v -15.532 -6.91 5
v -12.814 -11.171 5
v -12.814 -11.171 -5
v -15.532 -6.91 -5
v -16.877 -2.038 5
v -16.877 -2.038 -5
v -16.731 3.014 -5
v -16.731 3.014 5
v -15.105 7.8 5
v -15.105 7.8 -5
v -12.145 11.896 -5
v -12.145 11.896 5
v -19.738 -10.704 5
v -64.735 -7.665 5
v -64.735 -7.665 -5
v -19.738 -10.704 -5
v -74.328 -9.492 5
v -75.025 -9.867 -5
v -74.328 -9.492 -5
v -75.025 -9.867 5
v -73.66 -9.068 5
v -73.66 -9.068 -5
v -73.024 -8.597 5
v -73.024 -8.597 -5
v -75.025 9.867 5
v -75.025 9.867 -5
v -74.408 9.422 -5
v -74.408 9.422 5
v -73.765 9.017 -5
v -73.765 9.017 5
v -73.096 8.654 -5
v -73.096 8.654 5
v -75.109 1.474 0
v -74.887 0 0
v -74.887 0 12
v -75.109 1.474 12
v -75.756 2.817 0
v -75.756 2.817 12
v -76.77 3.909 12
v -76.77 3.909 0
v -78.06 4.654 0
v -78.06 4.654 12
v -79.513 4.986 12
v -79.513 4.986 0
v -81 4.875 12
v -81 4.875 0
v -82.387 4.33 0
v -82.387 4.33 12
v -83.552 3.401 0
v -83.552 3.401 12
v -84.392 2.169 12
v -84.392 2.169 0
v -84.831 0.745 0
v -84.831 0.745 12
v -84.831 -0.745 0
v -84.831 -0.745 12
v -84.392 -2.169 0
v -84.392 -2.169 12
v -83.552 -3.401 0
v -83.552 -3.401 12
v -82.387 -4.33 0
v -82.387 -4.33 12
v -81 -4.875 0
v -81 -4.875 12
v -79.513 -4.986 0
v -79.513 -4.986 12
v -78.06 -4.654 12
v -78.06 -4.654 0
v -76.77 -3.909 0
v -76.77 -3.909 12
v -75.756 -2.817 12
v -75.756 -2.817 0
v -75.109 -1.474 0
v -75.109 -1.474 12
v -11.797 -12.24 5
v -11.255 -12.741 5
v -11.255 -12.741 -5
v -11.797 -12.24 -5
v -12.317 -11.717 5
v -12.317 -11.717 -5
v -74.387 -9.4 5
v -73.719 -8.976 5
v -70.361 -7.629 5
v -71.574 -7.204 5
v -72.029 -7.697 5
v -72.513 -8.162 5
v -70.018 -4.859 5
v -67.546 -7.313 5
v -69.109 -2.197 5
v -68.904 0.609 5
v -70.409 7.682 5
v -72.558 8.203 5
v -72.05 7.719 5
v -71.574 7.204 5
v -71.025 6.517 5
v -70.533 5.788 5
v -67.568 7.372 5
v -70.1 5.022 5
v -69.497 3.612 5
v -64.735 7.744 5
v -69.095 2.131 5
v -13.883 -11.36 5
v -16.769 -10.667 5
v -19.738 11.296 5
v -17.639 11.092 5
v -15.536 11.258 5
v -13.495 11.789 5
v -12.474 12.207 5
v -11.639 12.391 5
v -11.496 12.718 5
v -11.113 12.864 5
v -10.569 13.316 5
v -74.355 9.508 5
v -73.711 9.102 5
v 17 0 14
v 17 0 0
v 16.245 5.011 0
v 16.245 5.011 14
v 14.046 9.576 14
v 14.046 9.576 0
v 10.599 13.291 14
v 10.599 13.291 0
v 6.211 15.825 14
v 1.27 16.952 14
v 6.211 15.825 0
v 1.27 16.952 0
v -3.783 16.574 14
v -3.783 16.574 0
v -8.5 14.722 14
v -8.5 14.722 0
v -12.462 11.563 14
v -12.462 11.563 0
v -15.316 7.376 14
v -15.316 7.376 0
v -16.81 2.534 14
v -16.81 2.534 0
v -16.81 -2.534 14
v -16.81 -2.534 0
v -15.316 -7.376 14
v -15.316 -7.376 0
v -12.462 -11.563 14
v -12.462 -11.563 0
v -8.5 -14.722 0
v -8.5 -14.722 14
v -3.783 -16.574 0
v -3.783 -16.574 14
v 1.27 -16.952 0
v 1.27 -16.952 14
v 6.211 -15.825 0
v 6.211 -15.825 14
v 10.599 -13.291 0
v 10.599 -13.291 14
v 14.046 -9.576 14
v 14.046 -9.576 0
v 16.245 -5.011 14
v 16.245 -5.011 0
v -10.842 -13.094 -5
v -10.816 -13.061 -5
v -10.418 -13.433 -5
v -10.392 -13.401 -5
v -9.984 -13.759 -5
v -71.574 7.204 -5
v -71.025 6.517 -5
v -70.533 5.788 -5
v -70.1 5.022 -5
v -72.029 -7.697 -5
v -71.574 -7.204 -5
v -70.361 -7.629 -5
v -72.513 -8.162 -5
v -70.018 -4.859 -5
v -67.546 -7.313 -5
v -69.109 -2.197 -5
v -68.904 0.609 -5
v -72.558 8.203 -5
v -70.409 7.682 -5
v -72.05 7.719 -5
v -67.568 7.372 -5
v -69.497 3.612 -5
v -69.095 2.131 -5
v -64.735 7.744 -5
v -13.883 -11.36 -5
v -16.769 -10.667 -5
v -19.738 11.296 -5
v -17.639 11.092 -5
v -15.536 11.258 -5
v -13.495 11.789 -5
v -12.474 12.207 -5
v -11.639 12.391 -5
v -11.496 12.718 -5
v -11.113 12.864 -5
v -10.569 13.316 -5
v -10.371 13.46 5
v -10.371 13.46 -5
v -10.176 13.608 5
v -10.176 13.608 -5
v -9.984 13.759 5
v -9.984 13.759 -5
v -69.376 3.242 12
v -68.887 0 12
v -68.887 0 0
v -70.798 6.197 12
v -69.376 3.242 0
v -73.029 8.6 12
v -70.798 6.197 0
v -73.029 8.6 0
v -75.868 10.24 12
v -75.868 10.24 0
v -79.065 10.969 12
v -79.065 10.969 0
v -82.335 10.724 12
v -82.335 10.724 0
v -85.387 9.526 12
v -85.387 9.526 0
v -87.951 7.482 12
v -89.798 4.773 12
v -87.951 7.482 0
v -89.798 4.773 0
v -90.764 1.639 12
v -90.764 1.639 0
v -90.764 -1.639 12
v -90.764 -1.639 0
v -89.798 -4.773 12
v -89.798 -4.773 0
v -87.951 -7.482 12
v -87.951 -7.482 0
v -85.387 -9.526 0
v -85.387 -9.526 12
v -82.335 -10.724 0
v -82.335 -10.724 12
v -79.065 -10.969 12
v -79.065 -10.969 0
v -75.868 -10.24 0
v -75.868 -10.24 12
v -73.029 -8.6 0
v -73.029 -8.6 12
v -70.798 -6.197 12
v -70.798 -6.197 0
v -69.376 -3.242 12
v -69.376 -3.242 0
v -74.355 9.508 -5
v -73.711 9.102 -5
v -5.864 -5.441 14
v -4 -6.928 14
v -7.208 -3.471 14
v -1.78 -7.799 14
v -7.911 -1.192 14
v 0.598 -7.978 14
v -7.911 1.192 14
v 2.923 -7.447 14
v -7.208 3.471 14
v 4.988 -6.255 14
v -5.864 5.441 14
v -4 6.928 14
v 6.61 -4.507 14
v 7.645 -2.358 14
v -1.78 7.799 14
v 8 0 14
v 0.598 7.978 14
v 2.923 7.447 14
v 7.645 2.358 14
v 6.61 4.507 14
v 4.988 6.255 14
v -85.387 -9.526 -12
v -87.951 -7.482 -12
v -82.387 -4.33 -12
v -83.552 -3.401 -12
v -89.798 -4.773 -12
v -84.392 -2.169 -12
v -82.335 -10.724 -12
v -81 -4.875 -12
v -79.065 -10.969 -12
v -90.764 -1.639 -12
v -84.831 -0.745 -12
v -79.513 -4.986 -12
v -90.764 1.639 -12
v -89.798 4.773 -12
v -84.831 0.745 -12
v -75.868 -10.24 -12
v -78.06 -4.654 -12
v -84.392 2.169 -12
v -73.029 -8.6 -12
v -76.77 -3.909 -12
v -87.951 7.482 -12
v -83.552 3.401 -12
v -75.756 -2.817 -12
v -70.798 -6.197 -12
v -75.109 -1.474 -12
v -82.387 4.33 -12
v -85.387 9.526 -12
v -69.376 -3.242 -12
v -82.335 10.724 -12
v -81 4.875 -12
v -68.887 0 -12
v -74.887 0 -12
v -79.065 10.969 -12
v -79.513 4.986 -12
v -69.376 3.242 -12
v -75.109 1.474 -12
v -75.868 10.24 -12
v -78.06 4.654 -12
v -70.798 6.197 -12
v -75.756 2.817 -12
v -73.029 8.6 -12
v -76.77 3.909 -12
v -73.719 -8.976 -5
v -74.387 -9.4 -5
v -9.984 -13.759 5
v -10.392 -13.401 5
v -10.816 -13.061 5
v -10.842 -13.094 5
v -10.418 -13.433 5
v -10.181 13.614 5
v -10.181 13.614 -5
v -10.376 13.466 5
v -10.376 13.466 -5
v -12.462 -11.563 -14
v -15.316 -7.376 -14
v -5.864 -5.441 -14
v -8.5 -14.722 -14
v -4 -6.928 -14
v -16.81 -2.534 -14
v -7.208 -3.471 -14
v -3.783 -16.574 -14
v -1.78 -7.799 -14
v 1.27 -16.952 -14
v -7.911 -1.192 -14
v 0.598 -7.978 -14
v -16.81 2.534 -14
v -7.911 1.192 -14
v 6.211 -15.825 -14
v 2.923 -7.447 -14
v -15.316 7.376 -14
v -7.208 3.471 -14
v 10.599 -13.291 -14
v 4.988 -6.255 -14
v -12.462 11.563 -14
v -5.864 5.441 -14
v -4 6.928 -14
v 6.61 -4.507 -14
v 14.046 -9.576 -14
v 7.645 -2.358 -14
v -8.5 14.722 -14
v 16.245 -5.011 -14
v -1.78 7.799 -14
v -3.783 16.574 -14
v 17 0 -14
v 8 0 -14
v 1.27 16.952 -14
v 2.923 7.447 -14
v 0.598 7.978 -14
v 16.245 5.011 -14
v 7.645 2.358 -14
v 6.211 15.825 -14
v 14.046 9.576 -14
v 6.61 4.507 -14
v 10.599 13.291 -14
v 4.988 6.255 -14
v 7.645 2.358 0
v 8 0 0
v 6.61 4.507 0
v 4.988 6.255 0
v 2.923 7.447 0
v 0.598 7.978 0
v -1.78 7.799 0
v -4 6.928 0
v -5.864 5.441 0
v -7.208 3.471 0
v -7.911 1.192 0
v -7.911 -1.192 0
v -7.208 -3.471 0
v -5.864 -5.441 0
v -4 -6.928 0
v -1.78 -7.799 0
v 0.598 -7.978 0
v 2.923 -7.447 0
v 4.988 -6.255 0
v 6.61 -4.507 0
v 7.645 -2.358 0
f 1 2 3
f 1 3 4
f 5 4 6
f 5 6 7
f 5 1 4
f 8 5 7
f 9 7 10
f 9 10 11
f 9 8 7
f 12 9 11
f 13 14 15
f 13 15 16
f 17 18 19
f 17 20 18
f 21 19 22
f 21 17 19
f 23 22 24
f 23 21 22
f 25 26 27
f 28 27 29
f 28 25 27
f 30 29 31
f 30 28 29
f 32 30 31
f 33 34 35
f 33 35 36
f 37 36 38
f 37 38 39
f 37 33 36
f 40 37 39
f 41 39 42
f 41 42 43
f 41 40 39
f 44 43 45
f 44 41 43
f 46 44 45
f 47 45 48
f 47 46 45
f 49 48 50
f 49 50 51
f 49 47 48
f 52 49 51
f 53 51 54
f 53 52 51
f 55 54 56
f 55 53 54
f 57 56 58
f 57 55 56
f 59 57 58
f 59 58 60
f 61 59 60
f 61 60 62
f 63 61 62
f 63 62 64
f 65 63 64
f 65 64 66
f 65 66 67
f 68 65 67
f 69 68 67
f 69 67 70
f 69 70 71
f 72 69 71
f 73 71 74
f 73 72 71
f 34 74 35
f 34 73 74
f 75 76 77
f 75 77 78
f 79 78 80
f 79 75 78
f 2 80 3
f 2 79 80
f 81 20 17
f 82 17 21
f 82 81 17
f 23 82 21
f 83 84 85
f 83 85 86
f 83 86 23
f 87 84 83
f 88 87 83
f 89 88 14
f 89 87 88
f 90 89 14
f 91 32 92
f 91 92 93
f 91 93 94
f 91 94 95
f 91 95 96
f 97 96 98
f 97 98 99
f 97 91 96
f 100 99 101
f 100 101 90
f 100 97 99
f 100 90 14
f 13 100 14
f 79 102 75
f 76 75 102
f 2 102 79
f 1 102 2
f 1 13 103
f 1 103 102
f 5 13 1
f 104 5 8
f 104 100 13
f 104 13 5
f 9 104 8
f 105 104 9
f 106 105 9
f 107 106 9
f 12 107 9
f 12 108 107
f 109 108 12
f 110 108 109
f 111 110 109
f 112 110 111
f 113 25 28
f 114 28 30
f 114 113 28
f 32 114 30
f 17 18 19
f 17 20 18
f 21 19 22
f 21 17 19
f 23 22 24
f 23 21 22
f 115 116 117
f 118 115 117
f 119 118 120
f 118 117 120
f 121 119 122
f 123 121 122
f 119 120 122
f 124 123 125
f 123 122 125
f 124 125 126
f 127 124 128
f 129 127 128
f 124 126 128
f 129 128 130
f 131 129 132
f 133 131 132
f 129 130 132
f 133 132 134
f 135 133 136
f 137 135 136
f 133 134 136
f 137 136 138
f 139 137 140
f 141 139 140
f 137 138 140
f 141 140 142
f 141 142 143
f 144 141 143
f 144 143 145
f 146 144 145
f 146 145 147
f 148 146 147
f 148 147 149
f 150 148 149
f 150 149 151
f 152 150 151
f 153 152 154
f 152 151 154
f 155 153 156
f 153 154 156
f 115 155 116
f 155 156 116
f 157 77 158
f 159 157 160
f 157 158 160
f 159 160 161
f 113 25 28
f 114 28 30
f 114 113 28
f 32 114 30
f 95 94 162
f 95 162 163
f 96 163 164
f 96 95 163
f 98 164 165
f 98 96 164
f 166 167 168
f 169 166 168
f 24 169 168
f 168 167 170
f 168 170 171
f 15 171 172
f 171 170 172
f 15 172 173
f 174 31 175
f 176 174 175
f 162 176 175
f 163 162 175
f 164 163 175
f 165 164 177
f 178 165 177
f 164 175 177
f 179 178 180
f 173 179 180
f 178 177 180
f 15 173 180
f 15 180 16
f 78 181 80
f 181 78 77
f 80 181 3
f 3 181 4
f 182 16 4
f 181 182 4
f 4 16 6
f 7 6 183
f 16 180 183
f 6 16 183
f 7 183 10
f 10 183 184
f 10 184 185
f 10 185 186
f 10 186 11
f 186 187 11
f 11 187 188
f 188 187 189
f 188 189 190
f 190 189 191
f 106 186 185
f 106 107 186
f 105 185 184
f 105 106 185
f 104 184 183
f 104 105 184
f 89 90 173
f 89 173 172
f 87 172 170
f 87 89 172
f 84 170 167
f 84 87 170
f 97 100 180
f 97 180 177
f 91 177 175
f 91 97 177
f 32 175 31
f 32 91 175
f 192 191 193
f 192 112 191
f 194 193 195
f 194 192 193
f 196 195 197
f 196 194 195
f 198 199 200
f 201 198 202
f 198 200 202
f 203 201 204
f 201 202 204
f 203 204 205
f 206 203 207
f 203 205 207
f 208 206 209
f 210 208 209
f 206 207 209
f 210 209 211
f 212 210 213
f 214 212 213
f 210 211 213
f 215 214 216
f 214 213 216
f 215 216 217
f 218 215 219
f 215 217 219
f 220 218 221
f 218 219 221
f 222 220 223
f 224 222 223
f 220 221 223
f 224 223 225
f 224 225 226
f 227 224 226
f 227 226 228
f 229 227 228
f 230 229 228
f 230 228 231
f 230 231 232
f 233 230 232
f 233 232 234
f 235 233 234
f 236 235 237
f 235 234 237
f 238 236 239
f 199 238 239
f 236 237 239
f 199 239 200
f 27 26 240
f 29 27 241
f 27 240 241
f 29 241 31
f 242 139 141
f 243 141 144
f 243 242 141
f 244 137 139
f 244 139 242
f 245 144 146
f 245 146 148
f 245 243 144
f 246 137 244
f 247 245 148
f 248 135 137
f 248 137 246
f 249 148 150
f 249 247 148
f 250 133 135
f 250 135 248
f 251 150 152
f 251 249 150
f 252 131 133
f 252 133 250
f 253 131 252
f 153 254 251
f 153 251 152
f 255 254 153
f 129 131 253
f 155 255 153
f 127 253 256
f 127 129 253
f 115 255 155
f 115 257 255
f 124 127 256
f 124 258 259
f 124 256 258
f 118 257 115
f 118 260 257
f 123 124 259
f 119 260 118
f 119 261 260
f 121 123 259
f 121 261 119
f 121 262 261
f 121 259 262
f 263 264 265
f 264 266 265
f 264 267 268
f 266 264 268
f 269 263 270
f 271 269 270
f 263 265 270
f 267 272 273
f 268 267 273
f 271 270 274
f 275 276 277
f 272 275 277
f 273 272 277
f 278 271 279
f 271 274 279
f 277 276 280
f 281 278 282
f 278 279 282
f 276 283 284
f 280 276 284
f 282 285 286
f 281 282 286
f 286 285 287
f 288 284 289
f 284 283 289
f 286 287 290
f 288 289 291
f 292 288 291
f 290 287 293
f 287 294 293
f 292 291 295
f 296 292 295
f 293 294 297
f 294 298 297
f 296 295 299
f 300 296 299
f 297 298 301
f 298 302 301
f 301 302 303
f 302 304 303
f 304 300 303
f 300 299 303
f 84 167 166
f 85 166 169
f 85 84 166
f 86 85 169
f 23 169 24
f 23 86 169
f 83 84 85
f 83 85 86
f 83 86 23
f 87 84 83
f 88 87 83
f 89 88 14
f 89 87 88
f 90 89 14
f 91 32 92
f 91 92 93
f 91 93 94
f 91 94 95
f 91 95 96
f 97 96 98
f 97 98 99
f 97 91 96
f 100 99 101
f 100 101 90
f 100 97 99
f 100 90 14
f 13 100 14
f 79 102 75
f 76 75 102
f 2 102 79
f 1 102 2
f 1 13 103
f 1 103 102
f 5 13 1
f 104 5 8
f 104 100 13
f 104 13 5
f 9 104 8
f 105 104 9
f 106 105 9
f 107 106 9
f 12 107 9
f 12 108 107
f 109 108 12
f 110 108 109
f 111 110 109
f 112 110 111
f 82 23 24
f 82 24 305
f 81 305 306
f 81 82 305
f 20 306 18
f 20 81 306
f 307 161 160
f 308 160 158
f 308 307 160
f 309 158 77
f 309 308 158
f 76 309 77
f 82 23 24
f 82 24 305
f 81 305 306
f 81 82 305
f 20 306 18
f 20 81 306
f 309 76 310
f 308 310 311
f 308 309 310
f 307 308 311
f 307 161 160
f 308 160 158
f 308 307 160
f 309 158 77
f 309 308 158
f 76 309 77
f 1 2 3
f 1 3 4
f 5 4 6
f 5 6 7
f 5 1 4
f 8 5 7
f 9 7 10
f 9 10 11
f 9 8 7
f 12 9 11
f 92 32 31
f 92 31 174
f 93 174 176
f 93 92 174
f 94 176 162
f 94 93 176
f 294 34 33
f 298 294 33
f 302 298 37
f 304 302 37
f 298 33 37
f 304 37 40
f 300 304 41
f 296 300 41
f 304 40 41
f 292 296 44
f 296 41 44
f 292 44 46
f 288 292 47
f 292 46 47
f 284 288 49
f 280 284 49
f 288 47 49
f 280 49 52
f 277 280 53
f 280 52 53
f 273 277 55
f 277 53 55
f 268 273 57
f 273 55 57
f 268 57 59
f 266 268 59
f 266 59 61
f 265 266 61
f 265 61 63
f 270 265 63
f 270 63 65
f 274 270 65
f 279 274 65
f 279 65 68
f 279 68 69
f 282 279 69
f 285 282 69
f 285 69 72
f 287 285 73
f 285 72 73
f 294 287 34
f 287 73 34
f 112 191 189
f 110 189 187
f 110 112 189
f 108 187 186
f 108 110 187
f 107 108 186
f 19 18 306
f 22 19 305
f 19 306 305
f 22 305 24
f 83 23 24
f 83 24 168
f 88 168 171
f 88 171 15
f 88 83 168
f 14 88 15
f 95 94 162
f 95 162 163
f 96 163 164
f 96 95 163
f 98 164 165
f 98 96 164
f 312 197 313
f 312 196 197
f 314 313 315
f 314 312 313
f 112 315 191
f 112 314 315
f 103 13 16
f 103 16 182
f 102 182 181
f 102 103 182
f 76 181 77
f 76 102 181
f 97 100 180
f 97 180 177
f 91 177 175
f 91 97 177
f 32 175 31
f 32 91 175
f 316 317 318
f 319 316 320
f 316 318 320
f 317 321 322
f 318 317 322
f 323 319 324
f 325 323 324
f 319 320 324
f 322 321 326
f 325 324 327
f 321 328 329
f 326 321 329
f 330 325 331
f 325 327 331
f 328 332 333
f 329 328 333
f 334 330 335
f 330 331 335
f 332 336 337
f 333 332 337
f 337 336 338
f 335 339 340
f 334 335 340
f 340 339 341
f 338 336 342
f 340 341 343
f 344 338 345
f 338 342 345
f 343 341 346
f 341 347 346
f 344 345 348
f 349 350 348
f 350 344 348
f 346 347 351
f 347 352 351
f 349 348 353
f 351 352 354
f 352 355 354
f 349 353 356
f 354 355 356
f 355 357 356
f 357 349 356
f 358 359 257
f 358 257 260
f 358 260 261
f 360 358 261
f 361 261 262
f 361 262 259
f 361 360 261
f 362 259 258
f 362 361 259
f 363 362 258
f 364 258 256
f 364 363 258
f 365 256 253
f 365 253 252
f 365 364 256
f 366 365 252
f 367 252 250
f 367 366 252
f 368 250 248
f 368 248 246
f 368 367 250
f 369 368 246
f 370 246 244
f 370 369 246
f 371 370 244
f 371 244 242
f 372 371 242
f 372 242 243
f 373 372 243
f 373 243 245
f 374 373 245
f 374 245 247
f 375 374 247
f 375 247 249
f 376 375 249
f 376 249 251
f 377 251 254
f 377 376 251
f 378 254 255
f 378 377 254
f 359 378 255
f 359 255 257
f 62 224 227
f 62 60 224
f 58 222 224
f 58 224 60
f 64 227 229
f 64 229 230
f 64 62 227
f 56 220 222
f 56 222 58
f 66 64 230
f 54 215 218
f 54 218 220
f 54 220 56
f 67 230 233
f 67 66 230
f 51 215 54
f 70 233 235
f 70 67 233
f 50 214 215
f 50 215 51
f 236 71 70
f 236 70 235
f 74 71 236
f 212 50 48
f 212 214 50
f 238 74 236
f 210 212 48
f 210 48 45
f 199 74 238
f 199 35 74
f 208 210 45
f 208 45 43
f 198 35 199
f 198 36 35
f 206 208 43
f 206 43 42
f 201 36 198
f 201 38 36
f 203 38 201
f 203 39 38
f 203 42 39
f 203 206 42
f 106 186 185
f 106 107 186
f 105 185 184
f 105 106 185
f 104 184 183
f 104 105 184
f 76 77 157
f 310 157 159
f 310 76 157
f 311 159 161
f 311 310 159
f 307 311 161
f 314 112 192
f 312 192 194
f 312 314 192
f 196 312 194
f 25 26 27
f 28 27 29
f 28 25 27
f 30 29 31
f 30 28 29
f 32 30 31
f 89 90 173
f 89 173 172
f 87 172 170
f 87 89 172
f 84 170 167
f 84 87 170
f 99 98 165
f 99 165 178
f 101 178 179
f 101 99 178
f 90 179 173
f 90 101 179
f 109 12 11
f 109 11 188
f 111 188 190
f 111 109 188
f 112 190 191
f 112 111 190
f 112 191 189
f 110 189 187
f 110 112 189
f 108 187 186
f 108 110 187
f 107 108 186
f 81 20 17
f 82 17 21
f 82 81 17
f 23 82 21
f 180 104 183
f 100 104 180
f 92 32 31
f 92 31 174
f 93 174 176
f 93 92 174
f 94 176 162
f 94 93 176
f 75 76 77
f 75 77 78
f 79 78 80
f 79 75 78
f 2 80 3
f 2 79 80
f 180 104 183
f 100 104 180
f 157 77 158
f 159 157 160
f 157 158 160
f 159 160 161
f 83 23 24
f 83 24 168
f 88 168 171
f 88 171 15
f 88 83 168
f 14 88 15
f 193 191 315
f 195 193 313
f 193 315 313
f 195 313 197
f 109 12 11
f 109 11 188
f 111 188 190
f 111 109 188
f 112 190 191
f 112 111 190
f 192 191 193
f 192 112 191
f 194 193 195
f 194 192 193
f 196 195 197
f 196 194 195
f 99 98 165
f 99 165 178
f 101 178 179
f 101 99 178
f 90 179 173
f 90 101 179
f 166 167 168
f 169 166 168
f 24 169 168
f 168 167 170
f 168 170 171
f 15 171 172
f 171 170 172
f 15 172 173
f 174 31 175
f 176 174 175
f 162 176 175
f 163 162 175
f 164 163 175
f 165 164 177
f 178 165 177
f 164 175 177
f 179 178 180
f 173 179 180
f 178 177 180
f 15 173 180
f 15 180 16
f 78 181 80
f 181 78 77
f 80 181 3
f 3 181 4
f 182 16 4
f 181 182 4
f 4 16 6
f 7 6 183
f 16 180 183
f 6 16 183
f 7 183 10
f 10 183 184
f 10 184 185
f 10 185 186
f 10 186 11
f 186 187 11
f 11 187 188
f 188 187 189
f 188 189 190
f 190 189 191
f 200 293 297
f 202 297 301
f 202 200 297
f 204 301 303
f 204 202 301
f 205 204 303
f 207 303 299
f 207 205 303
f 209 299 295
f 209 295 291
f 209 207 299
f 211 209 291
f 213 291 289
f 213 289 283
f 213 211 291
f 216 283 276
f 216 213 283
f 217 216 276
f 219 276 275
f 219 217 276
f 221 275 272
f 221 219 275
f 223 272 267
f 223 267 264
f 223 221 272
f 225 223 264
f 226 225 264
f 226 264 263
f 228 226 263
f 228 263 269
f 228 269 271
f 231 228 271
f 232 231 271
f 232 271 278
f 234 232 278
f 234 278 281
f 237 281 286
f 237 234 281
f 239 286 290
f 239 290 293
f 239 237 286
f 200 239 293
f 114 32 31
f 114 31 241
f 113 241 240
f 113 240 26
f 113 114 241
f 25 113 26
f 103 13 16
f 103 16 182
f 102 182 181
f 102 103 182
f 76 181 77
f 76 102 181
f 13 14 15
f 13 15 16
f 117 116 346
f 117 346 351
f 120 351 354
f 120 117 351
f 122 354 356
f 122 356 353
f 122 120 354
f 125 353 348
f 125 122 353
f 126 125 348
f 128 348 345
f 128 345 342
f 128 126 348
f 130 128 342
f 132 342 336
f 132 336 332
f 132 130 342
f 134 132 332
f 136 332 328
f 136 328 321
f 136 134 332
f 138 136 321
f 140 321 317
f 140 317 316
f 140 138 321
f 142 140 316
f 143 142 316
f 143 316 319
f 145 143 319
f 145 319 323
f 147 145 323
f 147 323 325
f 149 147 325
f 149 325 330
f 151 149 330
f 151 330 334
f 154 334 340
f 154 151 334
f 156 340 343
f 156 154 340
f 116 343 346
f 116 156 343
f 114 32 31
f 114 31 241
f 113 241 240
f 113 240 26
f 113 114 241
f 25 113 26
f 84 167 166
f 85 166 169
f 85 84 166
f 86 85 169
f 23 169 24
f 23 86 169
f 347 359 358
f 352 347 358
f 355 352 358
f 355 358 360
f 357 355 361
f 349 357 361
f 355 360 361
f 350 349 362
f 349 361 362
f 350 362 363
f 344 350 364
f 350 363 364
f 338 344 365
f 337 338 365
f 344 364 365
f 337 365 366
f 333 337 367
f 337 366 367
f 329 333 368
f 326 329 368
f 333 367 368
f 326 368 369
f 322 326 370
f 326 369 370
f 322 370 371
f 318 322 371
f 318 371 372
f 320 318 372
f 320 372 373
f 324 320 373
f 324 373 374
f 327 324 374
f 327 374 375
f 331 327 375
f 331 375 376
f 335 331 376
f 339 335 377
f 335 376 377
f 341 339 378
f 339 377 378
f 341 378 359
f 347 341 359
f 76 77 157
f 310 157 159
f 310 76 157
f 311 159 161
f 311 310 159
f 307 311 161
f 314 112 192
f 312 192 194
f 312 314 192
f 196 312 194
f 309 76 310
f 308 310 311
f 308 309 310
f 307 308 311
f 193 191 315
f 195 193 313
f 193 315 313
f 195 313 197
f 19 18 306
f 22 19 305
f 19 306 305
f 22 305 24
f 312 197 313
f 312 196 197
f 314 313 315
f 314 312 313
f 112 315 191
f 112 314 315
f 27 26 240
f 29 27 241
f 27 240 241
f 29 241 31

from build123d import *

# Parameters (mm, degrees)
F0_R      = 17
F0_R_2    = 8
F1_DEPTH  = 14
F2_R      = 17
F2_R_2    = 8
F3_DEPTH  = 14
F4_R      = 11
F4_R_2    = 5
F5_DEPTH  = 12
F6_R      = 11
F6_R_2    = 5
F7_DEPTH  = 12
F9_DEPTH  = 5
F10_DEPTH = 5


with BuildPart() as f1:
    # F0 (on Top) → F1 (new body)
    with BuildSketch(Plane.XY):
        Circle(F0_R)
        Circle(F0_R_2, mode=Mode.SUBTRACT)
    extrude(amount=-F1_DEPTH)

    # F2 (on face) → F3 (join)
    with BuildSketch(Plane.XY):
        Circle(F2_R)
        Circle(F2_R_2, mode=Mode.SUBTRACT)
    extrude(amount=F3_DEPTH)


with BuildPart() as f5:
    # F4 (on Top) → F5 (new body)
    with BuildSketch(Plane.XY):
        with Locations((-79.886973, 0)):
            Circle(F4_R)
        with Locations((-79.886973, 0)):
            Circle(F4_R_2, mode=Mode.SUBTRACT)
    extrude(amount=-F5_DEPTH)

    # F6 (on Top) → F7 (join)
    with BuildSketch(Plane.XY):
        with Locations((-79.886973, 0)):
            Circle(F6_R)
        with Locations((-79.886973, 0)):
            Circle(F6_R_2, mode=Mode.SUBTRACT)
    extrude(amount=F7_DEPTH)


with BuildPart() as f9:
    # F8 (on Top) → F9 (new body, symmetric)
    with BuildSketch(Plane.XY):
        with BuildLine():
            ThreePointArc((-9.983942, 13.759393), (-10.278623, 13.540676), (-10.568514, 13.315649))
            ThreePointArc((-10.568514, 13.315649), (-10.272835, 13.533051), (-9.983942, 13.759393))
        make_face()
        with BuildLine():
            ThreePointArc((-9.983942, -13.759393), (-10.602054, -13.228559), (-11.254762, -12.740892))
            ThreePointArc((-11.254762, -12.740892), (-10.631556, -13.265369), (-9.983942, -13.759393))
        make_face()
        with BuildLine():
            ThreePointArc((-75.025147, -9.867251), (-73.990363, -9.286011), (-73.024225, -8.596667))
            ThreePointArc((-73.024225, -8.596667), (-74.056134, -9.182435), (-75.025147, -9.867251))
        make_face()
        with BuildLine():
            ThreePointArc((-75.025147, 9.867251), (-74.089668, 9.214661), (-73.096455, 8.653835))
            ThreePointArc((-73.096455, 8.653835), (-74.029297, 9.310619), (-75.025147, 9.867251))
        make_face()
        with BuildLine():
            Line((-19.737622, 11.296302), (-64.735055, 7.743621))
            ThreePointArc((-64.735055, 7.743621), (-68.998113, 7.442176), (-73.096455, 8.653835))
            ThreePointArc((-73.096455, 8.653835), (-72.300451, 7.965217), (-71.573905, 7.203673))
            ThreePointArc((-71.573905, 7.203673), (-70.77157, 6.157063), (-70.10025, 5.021958))
            ThreePointArc((-70.10025, 5.021958), (-69.270229, 2.878323), (-68.903844, 0.608991))
            ThreePointArc((-68.903844, 0.608991), (-69.478071, -3.557354), (-71.573905, -7.203673))
            ThreePointArc((-71.573905, -7.203673), (-72.267166, -7.933382), (-73.024225, -8.596667))
            ThreePointArc((-73.024225, -8.596667), (-68.963156, -7.387645), (-64.735055, -7.665438))
            Line((-64.735055, -7.665438), (-19.737622, -10.703698))
            ThreePointArc((-19.737622, -10.703698), (-15.304505, -10.92411), (-11.254762, -12.740892))
            ThreePointArc((-11.254762, -12.740892), (-12.060072, -11.98143), (-12.814249, -11.171169))
            ThreePointArc((-12.814249, -11.171169), (-16.99284, 0.493353), (-12.144545, 11.895798))
            Line((-12.144545, 11.895798), (-13.495474, 11.789138))
            ThreePointArc((-13.495474, 11.789138), (-16.583836, 11.128403), (-19.737622, 11.296302))
        make_face()
        with BuildLine():
            ThreePointArc((-10.568514, 13.315649), (-11.979252, 12.451265), (-13.495474, 11.789138))
            Line((-13.495474, 11.789138), (-12.144545, 11.895798))
            ThreePointArc((-12.144545, 11.895798), (-11.378698, 12.63033), (-10.568514, 13.315649))
        make_face()
    extrude(amount=F9_DEPTH, both=True)


with BuildPart() as f10:
    # F8 (on Top) → F10 (new body, symmetric)
    with BuildSketch(Plane.XY):
        with BuildLine():
            ThreePointArc((-9.983942, 13.759393), (-10.278623, 13.540676), (-10.568514, 13.315649))
            ThreePointArc((-10.568514, 13.315649), (-10.272835, 13.533051), (-9.983942, 13.759393))
        make_face()
        with BuildLine():
            ThreePointArc((-9.983942, -13.759393), (-10.602054, -13.228559), (-11.254762, -12.740892))
            ThreePointArc((-11.254762, -12.740892), (-10.631556, -13.265369), (-9.983942, -13.759393))
        make_face()
        with BuildLine():
            ThreePointArc((-75.025147, -9.867251), (-73.990363, -9.286011), (-73.024225, -8.596667))
            ThreePointArc((-73.024225, -8.596667), (-74.056134, -9.182435), (-75.025147, -9.867251))
        make_face()
        with BuildLine():
            ThreePointArc((-75.025147, 9.867251), (-74.089668, 9.214661), (-73.096455, 8.653835))
            ThreePointArc((-73.096455, 8.653835), (-74.029297, 9.310619), (-75.025147, 9.867251))
        make_face()
        with BuildLine():
            Line((-19.737622, 11.296302), (-64.735055, 7.743621))
            ThreePointArc((-64.735055, 7.743621), (-68.998113, 7.442176), (-73.096455, 8.653835))
            ThreePointArc((-73.096455, 8.653835), (-72.300451, 7.965217), (-71.573905, 7.203673))
            ThreePointArc((-71.573905, 7.203673), (-70.77157, 6.157063), (-70.10025, 5.021958))
            ThreePointArc((-70.10025, 5.021958), (-69.270229, 2.878323), (-68.903844, 0.608991))
            ThreePointArc((-68.903844, 0.608991), (-69.478071, -3.557354), (-71.573905, -7.203673))
            ThreePointArc((-71.573905, -7.203673), (-72.267166, -7.933382), (-73.024225, -8.596667))
            ThreePointArc((-73.024225, -8.596667), (-68.963156, -7.387645), (-64.735055, -7.665438))
            Line((-64.735055, -7.665438), (-19.737622, -10.703698))
            ThreePointArc((-19.737622, -10.703698), (-15.304505, -10.92411), (-11.254762, -12.740892))
            ThreePointArc((-11.254762, -12.740892), (-12.060072, -11.98143), (-12.814249, -11.171169))
            ThreePointArc((-12.814249, -11.171169), (-16.99284, 0.493353), (-12.144545, 11.895798))
            Line((-12.144545, 11.895798), (-13.495474, 11.789138))
            ThreePointArc((-13.495474, 11.789138), (-16.583836, 11.128403), (-19.737622, 11.296302))
        make_face()
        with BuildLine():
            ThreePointArc((-10.568514, 13.315649), (-11.979252, 12.451265), (-13.495474, 11.789138))
            Line((-13.495474, 11.789138), (-12.144545, 11.895798))
            ThreePointArc((-12.144545, 11.895798), (-11.378698, 12.63033), (-10.568514, 13.315649))
        make_face()
    extrude(amount=F10_DEPTH, both=True)


solid = Compound([f1.part, f5.part, f9.part, f10.part])
